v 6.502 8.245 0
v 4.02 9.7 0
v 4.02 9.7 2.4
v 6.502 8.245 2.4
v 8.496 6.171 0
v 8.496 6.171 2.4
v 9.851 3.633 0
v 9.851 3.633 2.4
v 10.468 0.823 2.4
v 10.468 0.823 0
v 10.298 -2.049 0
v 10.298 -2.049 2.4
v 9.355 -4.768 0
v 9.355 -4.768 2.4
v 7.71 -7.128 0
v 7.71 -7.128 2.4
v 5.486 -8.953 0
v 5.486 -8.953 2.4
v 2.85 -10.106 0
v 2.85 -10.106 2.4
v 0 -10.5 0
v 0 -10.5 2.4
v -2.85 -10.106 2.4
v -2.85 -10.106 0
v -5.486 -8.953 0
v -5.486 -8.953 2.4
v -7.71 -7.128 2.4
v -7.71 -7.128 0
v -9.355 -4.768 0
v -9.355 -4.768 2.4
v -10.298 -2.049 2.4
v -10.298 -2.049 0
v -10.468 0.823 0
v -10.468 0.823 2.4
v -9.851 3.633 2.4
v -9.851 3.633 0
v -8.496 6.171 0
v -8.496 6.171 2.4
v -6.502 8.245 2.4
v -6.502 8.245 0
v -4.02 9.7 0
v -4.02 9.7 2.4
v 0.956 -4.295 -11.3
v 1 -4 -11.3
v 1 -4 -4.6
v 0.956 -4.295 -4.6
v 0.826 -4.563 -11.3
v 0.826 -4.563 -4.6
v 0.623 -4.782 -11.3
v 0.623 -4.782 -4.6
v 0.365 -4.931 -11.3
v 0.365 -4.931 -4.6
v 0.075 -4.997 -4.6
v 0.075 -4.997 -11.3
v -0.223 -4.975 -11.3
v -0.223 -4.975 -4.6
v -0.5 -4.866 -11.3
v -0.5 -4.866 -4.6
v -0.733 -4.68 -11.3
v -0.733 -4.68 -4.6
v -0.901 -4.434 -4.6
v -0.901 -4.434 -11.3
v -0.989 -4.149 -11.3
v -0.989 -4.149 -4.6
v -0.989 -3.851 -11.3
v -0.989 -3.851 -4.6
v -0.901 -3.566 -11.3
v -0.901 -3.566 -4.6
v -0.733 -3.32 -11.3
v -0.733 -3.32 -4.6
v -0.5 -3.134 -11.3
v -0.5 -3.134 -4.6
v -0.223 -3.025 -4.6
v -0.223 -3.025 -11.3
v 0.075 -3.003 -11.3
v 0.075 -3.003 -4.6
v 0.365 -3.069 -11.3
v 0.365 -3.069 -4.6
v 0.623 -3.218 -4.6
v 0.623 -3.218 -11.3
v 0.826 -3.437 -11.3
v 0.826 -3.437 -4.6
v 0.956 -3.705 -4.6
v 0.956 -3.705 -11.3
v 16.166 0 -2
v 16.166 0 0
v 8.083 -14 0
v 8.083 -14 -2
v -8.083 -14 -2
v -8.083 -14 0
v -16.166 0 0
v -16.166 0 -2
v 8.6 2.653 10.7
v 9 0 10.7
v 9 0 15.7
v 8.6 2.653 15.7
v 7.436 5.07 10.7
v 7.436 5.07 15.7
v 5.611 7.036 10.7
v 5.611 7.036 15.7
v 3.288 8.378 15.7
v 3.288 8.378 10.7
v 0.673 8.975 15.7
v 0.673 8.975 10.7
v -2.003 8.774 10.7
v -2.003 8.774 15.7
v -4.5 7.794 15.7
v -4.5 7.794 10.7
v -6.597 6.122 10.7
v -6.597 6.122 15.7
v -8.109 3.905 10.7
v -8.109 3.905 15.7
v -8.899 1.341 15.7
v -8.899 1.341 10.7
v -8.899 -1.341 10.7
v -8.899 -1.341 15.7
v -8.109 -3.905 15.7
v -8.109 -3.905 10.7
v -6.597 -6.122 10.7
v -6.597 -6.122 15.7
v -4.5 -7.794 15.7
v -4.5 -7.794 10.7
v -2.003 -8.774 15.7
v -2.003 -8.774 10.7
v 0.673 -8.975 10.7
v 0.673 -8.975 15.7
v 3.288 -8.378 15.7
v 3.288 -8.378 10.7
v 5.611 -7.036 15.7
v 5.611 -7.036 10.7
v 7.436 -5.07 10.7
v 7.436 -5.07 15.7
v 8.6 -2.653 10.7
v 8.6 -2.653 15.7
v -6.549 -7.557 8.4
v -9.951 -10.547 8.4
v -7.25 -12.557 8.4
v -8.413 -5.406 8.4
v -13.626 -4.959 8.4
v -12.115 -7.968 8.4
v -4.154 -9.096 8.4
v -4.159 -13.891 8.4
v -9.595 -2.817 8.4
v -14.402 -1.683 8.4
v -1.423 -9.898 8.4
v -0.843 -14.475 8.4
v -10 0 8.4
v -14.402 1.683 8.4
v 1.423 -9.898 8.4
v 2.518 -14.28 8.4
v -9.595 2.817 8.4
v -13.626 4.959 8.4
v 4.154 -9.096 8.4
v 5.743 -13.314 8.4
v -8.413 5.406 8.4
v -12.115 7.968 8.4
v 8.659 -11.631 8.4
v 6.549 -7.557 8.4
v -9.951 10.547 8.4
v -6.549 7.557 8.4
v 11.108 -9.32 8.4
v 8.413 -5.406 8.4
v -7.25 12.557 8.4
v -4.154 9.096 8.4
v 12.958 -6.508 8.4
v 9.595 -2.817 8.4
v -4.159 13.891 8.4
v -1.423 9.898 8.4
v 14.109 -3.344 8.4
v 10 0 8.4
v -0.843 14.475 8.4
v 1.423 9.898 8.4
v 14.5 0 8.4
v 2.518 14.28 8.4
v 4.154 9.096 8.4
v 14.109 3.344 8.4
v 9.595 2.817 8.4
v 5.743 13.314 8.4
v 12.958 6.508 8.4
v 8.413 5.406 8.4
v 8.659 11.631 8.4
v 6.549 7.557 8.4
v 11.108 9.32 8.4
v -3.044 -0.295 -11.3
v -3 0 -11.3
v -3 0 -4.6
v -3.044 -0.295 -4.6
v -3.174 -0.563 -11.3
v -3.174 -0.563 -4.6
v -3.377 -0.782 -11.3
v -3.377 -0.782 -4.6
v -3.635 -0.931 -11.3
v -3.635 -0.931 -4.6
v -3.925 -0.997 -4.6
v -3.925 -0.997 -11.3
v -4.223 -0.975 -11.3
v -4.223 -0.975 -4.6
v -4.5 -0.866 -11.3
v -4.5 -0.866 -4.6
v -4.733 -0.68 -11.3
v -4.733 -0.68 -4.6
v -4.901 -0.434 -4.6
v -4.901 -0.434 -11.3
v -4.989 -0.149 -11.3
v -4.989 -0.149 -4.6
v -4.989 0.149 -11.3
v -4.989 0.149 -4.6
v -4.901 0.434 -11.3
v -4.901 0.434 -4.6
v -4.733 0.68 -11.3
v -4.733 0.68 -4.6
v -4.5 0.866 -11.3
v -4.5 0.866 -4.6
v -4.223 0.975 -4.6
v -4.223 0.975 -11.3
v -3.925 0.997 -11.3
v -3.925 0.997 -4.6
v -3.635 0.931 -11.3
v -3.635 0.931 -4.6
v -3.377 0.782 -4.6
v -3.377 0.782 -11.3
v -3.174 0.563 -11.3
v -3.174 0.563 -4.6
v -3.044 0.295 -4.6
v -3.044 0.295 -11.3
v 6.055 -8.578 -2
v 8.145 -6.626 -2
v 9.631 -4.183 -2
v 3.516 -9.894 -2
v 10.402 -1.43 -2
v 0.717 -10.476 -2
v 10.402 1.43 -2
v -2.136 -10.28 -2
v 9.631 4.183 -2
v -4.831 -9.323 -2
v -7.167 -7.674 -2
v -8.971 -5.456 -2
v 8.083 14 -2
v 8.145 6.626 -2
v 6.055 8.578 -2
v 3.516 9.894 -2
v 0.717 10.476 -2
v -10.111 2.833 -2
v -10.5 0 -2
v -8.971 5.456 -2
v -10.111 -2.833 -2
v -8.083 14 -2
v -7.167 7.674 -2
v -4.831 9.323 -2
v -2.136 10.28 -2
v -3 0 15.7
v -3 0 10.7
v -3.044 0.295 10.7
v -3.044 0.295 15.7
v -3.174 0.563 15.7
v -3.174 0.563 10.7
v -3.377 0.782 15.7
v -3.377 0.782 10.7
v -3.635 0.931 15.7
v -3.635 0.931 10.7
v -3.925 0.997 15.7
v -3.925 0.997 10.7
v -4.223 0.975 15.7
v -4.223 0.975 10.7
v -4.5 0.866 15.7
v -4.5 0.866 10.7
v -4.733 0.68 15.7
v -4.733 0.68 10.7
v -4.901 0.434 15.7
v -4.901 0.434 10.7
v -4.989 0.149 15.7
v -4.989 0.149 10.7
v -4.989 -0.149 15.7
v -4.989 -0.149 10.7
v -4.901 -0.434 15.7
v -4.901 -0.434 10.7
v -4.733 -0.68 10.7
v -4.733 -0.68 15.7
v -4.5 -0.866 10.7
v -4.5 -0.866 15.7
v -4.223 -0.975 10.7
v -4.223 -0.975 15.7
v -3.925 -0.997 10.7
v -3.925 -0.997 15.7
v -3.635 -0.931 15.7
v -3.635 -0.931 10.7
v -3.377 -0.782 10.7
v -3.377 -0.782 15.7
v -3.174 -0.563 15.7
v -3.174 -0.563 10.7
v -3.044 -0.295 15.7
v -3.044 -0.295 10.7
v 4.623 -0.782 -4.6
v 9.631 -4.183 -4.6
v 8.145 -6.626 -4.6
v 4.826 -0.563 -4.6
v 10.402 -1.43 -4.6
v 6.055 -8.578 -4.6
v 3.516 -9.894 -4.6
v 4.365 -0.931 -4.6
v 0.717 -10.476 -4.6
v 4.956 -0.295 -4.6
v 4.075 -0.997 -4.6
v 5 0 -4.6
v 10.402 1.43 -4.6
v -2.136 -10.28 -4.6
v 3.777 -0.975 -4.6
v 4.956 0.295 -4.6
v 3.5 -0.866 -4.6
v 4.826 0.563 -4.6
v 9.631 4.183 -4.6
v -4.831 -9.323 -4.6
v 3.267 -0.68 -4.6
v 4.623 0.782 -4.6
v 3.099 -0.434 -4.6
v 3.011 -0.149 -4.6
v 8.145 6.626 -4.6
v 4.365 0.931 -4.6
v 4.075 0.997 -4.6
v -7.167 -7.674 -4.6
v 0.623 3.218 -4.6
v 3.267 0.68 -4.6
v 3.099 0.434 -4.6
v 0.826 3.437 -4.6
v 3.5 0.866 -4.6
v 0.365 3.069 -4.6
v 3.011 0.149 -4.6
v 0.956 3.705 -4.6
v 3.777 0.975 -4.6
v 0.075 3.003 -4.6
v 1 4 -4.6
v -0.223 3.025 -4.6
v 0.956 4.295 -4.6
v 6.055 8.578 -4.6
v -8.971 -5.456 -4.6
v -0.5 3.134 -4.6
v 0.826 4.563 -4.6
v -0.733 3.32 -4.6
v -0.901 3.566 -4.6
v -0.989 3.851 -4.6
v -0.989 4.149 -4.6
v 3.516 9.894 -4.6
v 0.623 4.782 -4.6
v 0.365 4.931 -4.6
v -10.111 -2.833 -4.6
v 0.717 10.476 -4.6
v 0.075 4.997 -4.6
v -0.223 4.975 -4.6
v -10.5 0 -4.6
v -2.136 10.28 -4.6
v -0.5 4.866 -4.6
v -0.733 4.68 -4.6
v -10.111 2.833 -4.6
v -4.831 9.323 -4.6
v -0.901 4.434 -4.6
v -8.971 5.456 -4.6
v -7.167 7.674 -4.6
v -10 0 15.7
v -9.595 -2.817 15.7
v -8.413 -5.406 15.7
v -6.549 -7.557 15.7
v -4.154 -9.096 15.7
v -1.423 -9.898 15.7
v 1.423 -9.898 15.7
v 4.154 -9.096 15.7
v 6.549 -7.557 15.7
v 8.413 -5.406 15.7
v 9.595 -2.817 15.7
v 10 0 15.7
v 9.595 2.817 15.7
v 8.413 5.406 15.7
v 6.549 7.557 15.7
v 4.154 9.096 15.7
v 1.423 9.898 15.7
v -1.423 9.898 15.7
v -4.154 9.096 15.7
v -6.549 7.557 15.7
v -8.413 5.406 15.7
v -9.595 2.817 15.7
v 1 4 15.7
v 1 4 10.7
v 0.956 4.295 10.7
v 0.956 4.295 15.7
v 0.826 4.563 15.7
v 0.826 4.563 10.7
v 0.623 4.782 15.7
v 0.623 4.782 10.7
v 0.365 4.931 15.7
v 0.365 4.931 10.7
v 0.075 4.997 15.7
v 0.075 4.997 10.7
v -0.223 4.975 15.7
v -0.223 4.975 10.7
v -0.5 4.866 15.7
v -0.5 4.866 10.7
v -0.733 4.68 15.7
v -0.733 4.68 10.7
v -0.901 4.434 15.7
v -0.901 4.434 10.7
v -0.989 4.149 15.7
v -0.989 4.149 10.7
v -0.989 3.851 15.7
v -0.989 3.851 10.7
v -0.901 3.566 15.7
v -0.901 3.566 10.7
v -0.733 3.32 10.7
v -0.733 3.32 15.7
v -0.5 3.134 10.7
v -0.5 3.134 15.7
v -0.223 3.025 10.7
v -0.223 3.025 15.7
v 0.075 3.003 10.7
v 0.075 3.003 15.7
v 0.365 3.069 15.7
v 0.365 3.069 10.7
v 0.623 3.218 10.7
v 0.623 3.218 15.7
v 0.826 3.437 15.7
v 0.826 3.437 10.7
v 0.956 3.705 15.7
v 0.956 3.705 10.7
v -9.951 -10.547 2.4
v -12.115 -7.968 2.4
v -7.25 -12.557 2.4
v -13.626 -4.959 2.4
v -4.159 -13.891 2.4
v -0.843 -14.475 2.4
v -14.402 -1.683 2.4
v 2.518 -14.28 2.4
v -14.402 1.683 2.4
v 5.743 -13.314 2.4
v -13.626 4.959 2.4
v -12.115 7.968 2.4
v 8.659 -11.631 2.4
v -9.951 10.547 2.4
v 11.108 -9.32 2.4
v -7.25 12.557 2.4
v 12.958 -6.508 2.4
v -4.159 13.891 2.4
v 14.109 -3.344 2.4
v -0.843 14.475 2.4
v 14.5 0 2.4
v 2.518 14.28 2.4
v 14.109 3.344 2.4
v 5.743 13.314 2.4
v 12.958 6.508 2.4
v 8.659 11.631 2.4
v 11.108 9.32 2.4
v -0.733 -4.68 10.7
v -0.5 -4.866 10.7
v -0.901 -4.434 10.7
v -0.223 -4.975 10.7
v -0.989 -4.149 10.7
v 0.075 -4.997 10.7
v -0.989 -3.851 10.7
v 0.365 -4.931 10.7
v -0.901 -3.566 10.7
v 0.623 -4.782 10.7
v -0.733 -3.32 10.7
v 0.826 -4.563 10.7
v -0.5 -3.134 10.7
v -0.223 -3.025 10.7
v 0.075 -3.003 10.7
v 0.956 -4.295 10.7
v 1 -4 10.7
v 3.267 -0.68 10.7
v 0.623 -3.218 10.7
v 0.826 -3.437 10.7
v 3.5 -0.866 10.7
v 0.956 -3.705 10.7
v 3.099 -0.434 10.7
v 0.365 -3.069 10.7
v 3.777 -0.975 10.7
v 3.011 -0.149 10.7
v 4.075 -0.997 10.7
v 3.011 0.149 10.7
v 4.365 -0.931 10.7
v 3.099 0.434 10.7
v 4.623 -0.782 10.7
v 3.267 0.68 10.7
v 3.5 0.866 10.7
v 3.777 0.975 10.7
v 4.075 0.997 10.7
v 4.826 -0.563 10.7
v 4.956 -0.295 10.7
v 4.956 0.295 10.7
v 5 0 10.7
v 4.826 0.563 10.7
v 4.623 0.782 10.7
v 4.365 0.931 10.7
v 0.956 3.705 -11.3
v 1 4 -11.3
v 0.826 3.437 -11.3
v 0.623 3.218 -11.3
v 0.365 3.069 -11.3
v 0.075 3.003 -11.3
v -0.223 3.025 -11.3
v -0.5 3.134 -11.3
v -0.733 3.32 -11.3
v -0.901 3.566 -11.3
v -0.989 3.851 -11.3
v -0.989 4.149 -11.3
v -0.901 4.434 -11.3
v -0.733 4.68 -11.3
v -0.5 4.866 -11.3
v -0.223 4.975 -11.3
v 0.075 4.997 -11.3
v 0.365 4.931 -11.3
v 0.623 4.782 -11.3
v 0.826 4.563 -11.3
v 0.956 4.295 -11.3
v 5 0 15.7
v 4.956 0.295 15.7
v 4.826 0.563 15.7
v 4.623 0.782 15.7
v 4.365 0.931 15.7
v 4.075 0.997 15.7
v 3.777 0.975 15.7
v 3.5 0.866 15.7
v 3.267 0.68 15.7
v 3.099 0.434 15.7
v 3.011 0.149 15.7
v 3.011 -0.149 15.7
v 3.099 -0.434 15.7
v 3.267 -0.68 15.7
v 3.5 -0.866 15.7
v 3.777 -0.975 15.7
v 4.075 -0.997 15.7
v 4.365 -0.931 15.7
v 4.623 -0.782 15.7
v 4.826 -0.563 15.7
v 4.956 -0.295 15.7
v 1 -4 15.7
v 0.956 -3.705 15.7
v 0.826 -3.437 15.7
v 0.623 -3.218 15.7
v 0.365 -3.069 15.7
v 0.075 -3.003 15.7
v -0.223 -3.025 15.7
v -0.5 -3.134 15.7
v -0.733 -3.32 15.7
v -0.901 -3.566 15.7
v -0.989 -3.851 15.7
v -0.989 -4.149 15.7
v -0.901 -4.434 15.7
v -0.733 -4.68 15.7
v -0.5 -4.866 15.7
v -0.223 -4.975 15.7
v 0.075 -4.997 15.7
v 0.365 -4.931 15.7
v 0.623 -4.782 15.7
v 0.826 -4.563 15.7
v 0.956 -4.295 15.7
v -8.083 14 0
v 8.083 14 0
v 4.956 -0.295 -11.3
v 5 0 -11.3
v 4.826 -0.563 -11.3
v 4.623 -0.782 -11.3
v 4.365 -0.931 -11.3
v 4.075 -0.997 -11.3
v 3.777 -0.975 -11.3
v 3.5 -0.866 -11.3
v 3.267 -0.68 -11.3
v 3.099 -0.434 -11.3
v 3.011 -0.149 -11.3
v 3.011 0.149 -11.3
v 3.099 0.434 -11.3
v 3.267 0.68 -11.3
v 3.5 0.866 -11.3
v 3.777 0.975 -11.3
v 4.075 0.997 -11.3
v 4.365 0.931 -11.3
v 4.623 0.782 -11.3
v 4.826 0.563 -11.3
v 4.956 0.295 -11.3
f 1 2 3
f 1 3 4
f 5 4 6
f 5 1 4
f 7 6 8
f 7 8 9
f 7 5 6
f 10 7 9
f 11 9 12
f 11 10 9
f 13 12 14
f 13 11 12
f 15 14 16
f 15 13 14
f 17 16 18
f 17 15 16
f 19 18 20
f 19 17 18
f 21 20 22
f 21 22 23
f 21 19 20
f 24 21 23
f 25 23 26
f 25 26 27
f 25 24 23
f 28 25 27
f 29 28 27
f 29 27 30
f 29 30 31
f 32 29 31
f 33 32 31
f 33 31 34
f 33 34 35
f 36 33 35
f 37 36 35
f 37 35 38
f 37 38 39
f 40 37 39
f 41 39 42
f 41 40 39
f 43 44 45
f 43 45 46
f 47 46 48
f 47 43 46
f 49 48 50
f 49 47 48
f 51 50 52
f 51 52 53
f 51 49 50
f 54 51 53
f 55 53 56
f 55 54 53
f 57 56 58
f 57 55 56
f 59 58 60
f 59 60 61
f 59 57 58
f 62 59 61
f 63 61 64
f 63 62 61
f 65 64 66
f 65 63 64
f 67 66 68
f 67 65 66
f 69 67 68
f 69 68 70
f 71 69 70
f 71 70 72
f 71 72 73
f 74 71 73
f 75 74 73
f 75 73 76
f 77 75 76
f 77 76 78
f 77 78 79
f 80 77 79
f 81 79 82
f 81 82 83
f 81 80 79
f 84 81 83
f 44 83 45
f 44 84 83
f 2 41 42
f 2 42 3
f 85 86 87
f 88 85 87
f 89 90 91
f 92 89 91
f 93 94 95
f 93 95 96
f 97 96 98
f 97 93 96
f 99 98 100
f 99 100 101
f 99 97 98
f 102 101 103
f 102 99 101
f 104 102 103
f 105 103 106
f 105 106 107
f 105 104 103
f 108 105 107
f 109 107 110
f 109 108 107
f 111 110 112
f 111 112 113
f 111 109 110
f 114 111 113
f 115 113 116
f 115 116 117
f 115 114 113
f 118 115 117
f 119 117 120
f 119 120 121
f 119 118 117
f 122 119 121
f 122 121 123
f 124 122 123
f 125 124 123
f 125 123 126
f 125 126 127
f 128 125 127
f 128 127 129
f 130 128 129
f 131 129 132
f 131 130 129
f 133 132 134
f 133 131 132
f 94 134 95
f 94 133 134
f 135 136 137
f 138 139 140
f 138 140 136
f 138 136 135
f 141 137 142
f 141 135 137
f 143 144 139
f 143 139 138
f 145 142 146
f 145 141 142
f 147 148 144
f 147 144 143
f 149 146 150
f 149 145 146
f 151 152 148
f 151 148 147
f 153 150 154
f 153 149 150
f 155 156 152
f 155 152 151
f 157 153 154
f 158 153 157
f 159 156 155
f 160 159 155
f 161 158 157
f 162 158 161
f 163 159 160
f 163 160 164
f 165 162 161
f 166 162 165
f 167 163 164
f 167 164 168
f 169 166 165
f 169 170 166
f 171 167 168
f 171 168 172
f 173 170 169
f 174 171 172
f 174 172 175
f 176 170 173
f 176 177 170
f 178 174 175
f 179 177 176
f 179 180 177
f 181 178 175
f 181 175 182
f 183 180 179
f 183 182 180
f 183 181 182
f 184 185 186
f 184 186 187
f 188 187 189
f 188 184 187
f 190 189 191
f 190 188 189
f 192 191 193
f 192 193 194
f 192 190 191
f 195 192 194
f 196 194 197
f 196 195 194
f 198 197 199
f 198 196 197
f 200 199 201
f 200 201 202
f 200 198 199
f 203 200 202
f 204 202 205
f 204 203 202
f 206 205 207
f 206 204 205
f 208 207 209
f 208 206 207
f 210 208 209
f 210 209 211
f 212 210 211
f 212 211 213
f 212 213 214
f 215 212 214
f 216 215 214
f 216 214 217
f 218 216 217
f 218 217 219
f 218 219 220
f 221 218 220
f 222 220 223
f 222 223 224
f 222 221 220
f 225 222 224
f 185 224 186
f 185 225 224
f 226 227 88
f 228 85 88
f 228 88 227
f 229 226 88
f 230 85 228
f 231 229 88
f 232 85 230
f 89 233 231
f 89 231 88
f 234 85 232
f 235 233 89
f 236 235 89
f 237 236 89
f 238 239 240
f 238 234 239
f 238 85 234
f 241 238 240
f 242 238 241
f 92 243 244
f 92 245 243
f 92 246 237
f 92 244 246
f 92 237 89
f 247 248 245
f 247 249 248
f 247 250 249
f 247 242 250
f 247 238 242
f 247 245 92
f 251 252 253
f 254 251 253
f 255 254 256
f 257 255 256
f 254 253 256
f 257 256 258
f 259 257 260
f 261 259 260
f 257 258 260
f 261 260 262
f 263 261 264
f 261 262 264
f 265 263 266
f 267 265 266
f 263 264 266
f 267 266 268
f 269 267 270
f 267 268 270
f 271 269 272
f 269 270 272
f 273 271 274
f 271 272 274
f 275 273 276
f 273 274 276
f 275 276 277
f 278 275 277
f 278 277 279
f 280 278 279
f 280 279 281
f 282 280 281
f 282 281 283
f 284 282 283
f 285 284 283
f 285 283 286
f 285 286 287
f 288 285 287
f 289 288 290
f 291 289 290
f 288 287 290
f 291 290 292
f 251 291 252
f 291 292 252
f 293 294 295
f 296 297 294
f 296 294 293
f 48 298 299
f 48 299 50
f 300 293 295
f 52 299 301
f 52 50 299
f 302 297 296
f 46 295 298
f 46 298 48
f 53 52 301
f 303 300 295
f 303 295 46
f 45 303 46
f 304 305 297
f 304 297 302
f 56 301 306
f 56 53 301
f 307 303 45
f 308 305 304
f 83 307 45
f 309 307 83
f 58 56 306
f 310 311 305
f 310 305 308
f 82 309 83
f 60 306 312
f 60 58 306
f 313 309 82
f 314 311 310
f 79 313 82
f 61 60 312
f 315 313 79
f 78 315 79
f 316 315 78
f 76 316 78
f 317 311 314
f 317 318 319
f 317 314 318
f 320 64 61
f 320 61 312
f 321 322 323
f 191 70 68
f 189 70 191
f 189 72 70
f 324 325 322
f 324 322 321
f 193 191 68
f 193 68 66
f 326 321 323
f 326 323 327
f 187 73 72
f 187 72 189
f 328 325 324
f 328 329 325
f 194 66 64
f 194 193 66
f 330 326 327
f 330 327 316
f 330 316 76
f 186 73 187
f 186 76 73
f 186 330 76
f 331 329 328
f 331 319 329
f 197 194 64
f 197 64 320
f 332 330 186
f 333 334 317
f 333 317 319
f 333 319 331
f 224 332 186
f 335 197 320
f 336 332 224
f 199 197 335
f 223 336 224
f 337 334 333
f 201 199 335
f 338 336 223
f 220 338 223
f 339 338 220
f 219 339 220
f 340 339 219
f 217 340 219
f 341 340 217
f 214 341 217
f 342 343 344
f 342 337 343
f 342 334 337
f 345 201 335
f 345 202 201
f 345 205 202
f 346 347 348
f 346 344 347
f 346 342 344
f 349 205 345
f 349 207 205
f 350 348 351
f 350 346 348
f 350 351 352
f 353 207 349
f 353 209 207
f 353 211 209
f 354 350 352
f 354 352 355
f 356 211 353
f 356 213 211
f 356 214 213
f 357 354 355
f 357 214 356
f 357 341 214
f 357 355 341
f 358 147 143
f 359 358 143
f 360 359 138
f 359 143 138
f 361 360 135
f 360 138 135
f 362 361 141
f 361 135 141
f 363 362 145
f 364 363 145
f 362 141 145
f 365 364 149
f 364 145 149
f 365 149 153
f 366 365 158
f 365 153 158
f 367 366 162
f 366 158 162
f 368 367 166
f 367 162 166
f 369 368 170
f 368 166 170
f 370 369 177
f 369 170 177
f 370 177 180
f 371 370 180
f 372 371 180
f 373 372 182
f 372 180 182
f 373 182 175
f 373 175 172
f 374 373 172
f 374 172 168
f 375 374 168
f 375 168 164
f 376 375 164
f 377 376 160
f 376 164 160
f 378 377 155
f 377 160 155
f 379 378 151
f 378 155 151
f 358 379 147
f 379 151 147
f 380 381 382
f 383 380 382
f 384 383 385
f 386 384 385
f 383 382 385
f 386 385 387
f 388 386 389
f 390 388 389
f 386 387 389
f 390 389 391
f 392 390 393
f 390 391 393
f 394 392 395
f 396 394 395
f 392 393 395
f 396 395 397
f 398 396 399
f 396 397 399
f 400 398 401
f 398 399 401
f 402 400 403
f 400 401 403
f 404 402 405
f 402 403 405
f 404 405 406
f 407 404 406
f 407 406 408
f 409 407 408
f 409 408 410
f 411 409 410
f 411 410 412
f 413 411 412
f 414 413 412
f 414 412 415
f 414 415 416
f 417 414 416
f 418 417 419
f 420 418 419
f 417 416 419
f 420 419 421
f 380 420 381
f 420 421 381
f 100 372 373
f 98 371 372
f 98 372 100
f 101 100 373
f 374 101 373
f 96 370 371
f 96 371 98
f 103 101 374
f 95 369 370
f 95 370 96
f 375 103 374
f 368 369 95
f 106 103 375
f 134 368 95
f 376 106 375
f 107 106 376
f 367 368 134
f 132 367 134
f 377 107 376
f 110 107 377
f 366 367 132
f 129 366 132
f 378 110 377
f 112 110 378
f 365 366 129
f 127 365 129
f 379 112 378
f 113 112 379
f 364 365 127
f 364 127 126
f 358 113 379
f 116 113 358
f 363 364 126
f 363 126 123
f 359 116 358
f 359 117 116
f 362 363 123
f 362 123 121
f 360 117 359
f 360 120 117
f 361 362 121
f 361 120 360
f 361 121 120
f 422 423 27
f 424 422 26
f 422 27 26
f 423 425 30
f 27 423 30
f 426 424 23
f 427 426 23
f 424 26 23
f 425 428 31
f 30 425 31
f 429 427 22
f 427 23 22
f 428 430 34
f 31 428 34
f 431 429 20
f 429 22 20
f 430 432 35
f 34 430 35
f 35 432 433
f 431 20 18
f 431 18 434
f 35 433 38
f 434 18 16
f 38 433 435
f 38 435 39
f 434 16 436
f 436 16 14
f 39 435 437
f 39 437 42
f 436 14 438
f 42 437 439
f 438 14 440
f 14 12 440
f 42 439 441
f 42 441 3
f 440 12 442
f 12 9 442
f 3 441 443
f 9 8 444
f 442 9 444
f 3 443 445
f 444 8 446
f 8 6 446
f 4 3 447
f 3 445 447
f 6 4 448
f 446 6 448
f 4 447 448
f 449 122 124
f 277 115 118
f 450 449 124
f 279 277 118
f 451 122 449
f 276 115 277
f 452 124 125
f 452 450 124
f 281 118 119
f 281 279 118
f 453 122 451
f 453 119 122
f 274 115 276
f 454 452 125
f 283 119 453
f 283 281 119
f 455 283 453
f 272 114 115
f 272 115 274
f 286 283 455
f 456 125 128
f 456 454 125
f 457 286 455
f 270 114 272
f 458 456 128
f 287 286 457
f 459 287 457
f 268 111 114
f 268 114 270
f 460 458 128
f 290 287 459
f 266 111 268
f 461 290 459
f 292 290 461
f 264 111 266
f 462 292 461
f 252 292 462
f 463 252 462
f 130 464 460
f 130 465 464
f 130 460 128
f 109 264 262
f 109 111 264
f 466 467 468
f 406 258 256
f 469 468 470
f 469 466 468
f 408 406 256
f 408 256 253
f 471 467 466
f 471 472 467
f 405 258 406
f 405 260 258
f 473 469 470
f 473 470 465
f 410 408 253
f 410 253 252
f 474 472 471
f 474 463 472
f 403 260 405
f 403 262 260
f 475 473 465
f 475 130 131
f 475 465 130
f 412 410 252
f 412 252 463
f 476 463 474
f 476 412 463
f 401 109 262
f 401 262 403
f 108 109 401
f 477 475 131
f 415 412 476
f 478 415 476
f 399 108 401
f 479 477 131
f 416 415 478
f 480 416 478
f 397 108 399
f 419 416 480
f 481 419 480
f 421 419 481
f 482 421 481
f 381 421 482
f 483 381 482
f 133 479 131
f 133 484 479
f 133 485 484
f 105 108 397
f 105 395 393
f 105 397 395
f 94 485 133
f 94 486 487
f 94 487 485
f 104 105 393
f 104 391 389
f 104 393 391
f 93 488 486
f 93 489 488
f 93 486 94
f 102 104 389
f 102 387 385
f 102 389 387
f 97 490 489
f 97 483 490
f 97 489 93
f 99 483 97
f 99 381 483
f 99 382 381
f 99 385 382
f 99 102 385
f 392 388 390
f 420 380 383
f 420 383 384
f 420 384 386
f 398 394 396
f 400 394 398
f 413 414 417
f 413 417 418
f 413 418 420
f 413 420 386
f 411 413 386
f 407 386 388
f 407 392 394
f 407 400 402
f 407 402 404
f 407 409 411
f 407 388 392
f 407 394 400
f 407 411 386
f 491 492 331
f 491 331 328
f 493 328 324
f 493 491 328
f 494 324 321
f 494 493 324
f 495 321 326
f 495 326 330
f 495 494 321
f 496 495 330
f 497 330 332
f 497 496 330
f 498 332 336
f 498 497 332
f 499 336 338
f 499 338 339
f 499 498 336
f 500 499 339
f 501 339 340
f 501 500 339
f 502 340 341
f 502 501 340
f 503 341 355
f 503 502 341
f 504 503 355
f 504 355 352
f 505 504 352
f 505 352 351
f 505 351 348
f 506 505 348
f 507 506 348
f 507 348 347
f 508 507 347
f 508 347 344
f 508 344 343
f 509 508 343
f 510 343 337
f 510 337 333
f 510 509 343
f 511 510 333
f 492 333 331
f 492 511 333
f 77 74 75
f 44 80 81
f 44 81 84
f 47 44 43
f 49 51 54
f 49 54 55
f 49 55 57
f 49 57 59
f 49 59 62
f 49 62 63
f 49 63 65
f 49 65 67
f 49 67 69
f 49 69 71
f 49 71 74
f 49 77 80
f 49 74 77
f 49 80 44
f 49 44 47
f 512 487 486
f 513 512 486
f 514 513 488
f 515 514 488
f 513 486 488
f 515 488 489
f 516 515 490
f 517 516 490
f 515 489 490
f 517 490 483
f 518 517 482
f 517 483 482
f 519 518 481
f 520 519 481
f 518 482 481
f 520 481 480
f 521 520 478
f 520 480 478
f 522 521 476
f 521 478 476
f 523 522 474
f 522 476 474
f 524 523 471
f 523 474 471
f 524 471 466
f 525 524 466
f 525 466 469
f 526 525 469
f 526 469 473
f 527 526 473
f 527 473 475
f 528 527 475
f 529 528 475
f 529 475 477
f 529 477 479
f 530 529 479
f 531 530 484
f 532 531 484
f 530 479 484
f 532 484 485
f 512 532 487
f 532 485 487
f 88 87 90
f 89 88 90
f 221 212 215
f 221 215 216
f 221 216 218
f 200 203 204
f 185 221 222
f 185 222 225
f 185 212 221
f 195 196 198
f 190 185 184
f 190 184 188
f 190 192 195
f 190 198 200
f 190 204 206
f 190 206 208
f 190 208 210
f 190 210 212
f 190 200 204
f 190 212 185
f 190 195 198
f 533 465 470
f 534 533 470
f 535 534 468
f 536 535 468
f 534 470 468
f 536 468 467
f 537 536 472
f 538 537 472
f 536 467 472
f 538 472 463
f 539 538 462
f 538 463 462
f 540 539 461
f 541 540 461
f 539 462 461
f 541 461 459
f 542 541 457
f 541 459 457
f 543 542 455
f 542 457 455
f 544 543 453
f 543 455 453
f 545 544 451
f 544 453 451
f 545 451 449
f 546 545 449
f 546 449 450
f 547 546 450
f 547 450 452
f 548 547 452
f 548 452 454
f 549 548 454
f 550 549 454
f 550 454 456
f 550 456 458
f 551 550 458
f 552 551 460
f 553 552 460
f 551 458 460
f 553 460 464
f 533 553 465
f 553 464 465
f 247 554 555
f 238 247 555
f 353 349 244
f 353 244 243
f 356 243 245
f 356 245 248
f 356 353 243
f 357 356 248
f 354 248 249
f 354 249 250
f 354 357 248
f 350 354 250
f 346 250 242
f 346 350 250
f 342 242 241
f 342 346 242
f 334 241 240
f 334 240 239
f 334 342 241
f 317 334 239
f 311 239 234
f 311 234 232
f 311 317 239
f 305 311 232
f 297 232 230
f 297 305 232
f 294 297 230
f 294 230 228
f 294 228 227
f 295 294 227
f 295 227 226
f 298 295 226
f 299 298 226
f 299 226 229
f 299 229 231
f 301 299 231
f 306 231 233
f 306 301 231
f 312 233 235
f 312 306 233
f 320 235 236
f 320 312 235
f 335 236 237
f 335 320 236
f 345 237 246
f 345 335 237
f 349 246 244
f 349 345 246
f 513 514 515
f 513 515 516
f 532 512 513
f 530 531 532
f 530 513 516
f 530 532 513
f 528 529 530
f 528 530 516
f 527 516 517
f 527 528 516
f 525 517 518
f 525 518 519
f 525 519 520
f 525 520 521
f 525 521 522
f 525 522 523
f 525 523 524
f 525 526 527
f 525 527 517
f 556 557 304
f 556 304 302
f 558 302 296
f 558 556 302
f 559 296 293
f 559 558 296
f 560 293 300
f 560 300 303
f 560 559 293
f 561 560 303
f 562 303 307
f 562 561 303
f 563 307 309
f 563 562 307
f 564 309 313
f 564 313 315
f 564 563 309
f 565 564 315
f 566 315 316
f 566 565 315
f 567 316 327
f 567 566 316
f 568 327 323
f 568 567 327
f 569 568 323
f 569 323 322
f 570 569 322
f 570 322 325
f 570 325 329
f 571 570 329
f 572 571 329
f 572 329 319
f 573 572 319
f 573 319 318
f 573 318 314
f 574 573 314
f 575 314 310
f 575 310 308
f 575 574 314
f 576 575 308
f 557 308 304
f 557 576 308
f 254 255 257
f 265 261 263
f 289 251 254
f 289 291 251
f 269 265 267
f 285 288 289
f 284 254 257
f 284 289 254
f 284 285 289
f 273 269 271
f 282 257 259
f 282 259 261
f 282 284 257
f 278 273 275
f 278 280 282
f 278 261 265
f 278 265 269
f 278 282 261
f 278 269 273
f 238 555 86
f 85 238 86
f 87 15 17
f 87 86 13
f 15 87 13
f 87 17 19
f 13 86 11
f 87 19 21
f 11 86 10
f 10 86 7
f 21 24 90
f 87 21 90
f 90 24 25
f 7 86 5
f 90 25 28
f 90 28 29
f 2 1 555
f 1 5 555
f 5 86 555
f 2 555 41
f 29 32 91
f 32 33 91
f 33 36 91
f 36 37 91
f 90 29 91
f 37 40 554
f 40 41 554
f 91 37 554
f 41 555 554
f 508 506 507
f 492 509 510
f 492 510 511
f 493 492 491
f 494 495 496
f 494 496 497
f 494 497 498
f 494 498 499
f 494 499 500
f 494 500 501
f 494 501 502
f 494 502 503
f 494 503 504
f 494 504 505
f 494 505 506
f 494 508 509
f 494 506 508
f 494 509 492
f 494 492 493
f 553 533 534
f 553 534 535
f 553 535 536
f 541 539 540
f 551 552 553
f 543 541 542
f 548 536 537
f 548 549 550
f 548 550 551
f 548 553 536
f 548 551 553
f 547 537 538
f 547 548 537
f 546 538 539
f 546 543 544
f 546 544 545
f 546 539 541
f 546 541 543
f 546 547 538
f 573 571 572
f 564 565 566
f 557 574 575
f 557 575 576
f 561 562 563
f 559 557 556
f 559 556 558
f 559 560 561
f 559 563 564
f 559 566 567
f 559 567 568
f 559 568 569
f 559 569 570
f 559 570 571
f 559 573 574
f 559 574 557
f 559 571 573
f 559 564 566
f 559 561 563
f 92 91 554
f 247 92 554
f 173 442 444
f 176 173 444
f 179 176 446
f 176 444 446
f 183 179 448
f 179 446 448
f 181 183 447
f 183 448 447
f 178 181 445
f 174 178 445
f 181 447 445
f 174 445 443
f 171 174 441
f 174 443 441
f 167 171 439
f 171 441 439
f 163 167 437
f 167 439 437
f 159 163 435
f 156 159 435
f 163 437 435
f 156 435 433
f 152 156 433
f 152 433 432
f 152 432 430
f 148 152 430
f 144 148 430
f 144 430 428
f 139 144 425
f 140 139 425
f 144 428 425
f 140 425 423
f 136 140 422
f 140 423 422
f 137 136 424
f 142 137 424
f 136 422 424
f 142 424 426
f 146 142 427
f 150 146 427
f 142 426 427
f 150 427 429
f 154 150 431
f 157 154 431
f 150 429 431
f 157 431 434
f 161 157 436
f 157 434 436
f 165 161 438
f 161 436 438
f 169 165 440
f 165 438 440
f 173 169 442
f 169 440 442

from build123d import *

# Parameters (mm, degrees)
DODANIE_WYCI_GNI_CIE1_DEPTH       = 2.4
SZKIC2_R                          = 14.5
DODANIE_WYCI_GNI_CIE2_DEPTH       = 6
SZKIC3_R                          = 10
DODANIE_WYCI_GNI_CIE3_DEPTH       = 7.3
DODANIE_WYCI_GNI_CIE4_START       = -5
DODANIE_WYCI_GNI_CIE4_OUTLINE_R   = 9
DODANIE_WYCI_GNI_CIE4_OUTLINE_R_2 = 1
DODANIE_WYCI_GNI_CIE4_DEPTH       = 5
DODANIE_WYCI_GNI_CIE5_DEPTH       = 2
DODANIE_WYCI_GNI_CIE6_START       = 7
SZKIC6_R                          = 10.5
DODANIE_WYCI_GNI_CIE6_DEPTH       = 2.6
DODANIE_WYCI_GNI_CIE7_START       = 6.7
SZKIC7_R                          = 1
DODANIE_WYCI_GNI_CIE7_DEPTH       = 6.7


# Read off the part's stored shape, not the designer's step: Dodanie-wyciągnięcie4
with BuildPart() as part:
    # Szkic1 → Dodanie-wyciągnięcie1 (new body)
    with BuildSketch(Plane.XY):
        with BuildLine():
            Line((-4.019950248, 9.7), (4.019950248, 9.7))
            ThreePointArc((4.019950248, 9.7), (0, -10.5), (-4.019950248, 9.7))
        make_face()
    extrude(amount=DODANIE_WYCI_GNI_CIE1_DEPTH)

    # Szkic2 → Dodanie-wyciągnięcie2 (add)
    with BuildSketch(Plane.XY.offset(2.4)):
        Circle(SZKIC2_R)
    extrude(amount=DODANIE_WYCI_GNI_CIE2_DEPTH)

    # Szkic3 → Dodanie-wyciągnięcie3 (add)
    with BuildSketch(Plane.XY.offset(8.4)):
        with Locations(Location((0, 0, 0), (0, 0, 180))):
            Circle(SZKIC3_R)
    extrude(amount=DODANIE_WYCI_GNI_CIE3_DEPTH)

    # Dodanie-wyciągnięcie4 outline → Dodanie-wyciągnięcie4 (cut)
    with BuildSketch(Plane.XY.offset(15.7).offset(DODANIE_WYCI_GNI_CIE4_START)):
        Circle(DODANIE_WYCI_GNI_CIE4_OUTLINE_R)
        with Locations((0, -4)):
            Circle(DODANIE_WYCI_GNI_CIE4_OUTLINE_R_2, mode=Mode.SUBTRACT)
        with Locations((-4, 0)):
            Circle(DODANIE_WYCI_GNI_CIE4_OUTLINE_R_2, mode=Mode.SUBTRACT)
        with Locations((4, 0)):
            Circle(DODANIE_WYCI_GNI_CIE4_OUTLINE_R_2, mode=Mode.SUBTRACT)
        with Locations((0, 4)):
            Circle(DODANIE_WYCI_GNI_CIE4_OUTLINE_R_2, mode=Mode.SUBTRACT)
    extrude(amount=DODANIE_WYCI_GNI_CIE4_DEPTH, mode=Mode.SUBTRACT)

    # Szkic5 → Dodanie-wyciągnięcie5 (add)
    with BuildSketch(Plane(origin=(0, 0, 0), x_dir=(-1, 0, 0), z_dir=(0, 0, -1))):
        Polygon((8.082903769, 14), (-8.082903769, 14), (-16.165807537, 0), (-8.082903769, -14), (8.082903769, -14), (16.165807537, 0), align=None)
    extrude(amount=DODANIE_WYCI_GNI_CIE5_DEPTH)

    # Szkic6 → Dodanie-wyciągnięcie6 (add)
    with BuildSketch(Plane(origin=(0, 0, 2.4), x_dir=(-1, 0, 0), z_dir=(0, 0, -1)).offset(DODANIE_WYCI_GNI_CIE6_START)):
        Circle(SZKIC6_R)
    extrude(amount=-DODANIE_WYCI_GNI_CIE6_DEPTH)

    # Szkic7 → Dodanie-wyciągnięcie7 (add)
    with BuildSketch(Plane(origin=(0, 0, -4.6), x_dir=(-1, 0, 0), z_dir=(0, 0, -1)).offset(DODANIE_WYCI_GNI_CIE7_START)):
        with Locations(Location((0, -4, 0), (0, 0, 180))):
            Circle(SZKIC7_R)
        with Locations(Location((4, 0, 0), (0, 0, 180))):
            Circle(SZKIC7_R)
        with Locations(Location((0, 4, 0), (0, 0, 180))):
            Circle(SZKIC7_R)
        with Locations(Location((-4, 0, 0), (0, 0, 180))):
            Circle(SZKIC7_R)
    extrude(amount=-DODANIE_WYCI_GNI_CIE7_DEPTH)


solid = part.part
